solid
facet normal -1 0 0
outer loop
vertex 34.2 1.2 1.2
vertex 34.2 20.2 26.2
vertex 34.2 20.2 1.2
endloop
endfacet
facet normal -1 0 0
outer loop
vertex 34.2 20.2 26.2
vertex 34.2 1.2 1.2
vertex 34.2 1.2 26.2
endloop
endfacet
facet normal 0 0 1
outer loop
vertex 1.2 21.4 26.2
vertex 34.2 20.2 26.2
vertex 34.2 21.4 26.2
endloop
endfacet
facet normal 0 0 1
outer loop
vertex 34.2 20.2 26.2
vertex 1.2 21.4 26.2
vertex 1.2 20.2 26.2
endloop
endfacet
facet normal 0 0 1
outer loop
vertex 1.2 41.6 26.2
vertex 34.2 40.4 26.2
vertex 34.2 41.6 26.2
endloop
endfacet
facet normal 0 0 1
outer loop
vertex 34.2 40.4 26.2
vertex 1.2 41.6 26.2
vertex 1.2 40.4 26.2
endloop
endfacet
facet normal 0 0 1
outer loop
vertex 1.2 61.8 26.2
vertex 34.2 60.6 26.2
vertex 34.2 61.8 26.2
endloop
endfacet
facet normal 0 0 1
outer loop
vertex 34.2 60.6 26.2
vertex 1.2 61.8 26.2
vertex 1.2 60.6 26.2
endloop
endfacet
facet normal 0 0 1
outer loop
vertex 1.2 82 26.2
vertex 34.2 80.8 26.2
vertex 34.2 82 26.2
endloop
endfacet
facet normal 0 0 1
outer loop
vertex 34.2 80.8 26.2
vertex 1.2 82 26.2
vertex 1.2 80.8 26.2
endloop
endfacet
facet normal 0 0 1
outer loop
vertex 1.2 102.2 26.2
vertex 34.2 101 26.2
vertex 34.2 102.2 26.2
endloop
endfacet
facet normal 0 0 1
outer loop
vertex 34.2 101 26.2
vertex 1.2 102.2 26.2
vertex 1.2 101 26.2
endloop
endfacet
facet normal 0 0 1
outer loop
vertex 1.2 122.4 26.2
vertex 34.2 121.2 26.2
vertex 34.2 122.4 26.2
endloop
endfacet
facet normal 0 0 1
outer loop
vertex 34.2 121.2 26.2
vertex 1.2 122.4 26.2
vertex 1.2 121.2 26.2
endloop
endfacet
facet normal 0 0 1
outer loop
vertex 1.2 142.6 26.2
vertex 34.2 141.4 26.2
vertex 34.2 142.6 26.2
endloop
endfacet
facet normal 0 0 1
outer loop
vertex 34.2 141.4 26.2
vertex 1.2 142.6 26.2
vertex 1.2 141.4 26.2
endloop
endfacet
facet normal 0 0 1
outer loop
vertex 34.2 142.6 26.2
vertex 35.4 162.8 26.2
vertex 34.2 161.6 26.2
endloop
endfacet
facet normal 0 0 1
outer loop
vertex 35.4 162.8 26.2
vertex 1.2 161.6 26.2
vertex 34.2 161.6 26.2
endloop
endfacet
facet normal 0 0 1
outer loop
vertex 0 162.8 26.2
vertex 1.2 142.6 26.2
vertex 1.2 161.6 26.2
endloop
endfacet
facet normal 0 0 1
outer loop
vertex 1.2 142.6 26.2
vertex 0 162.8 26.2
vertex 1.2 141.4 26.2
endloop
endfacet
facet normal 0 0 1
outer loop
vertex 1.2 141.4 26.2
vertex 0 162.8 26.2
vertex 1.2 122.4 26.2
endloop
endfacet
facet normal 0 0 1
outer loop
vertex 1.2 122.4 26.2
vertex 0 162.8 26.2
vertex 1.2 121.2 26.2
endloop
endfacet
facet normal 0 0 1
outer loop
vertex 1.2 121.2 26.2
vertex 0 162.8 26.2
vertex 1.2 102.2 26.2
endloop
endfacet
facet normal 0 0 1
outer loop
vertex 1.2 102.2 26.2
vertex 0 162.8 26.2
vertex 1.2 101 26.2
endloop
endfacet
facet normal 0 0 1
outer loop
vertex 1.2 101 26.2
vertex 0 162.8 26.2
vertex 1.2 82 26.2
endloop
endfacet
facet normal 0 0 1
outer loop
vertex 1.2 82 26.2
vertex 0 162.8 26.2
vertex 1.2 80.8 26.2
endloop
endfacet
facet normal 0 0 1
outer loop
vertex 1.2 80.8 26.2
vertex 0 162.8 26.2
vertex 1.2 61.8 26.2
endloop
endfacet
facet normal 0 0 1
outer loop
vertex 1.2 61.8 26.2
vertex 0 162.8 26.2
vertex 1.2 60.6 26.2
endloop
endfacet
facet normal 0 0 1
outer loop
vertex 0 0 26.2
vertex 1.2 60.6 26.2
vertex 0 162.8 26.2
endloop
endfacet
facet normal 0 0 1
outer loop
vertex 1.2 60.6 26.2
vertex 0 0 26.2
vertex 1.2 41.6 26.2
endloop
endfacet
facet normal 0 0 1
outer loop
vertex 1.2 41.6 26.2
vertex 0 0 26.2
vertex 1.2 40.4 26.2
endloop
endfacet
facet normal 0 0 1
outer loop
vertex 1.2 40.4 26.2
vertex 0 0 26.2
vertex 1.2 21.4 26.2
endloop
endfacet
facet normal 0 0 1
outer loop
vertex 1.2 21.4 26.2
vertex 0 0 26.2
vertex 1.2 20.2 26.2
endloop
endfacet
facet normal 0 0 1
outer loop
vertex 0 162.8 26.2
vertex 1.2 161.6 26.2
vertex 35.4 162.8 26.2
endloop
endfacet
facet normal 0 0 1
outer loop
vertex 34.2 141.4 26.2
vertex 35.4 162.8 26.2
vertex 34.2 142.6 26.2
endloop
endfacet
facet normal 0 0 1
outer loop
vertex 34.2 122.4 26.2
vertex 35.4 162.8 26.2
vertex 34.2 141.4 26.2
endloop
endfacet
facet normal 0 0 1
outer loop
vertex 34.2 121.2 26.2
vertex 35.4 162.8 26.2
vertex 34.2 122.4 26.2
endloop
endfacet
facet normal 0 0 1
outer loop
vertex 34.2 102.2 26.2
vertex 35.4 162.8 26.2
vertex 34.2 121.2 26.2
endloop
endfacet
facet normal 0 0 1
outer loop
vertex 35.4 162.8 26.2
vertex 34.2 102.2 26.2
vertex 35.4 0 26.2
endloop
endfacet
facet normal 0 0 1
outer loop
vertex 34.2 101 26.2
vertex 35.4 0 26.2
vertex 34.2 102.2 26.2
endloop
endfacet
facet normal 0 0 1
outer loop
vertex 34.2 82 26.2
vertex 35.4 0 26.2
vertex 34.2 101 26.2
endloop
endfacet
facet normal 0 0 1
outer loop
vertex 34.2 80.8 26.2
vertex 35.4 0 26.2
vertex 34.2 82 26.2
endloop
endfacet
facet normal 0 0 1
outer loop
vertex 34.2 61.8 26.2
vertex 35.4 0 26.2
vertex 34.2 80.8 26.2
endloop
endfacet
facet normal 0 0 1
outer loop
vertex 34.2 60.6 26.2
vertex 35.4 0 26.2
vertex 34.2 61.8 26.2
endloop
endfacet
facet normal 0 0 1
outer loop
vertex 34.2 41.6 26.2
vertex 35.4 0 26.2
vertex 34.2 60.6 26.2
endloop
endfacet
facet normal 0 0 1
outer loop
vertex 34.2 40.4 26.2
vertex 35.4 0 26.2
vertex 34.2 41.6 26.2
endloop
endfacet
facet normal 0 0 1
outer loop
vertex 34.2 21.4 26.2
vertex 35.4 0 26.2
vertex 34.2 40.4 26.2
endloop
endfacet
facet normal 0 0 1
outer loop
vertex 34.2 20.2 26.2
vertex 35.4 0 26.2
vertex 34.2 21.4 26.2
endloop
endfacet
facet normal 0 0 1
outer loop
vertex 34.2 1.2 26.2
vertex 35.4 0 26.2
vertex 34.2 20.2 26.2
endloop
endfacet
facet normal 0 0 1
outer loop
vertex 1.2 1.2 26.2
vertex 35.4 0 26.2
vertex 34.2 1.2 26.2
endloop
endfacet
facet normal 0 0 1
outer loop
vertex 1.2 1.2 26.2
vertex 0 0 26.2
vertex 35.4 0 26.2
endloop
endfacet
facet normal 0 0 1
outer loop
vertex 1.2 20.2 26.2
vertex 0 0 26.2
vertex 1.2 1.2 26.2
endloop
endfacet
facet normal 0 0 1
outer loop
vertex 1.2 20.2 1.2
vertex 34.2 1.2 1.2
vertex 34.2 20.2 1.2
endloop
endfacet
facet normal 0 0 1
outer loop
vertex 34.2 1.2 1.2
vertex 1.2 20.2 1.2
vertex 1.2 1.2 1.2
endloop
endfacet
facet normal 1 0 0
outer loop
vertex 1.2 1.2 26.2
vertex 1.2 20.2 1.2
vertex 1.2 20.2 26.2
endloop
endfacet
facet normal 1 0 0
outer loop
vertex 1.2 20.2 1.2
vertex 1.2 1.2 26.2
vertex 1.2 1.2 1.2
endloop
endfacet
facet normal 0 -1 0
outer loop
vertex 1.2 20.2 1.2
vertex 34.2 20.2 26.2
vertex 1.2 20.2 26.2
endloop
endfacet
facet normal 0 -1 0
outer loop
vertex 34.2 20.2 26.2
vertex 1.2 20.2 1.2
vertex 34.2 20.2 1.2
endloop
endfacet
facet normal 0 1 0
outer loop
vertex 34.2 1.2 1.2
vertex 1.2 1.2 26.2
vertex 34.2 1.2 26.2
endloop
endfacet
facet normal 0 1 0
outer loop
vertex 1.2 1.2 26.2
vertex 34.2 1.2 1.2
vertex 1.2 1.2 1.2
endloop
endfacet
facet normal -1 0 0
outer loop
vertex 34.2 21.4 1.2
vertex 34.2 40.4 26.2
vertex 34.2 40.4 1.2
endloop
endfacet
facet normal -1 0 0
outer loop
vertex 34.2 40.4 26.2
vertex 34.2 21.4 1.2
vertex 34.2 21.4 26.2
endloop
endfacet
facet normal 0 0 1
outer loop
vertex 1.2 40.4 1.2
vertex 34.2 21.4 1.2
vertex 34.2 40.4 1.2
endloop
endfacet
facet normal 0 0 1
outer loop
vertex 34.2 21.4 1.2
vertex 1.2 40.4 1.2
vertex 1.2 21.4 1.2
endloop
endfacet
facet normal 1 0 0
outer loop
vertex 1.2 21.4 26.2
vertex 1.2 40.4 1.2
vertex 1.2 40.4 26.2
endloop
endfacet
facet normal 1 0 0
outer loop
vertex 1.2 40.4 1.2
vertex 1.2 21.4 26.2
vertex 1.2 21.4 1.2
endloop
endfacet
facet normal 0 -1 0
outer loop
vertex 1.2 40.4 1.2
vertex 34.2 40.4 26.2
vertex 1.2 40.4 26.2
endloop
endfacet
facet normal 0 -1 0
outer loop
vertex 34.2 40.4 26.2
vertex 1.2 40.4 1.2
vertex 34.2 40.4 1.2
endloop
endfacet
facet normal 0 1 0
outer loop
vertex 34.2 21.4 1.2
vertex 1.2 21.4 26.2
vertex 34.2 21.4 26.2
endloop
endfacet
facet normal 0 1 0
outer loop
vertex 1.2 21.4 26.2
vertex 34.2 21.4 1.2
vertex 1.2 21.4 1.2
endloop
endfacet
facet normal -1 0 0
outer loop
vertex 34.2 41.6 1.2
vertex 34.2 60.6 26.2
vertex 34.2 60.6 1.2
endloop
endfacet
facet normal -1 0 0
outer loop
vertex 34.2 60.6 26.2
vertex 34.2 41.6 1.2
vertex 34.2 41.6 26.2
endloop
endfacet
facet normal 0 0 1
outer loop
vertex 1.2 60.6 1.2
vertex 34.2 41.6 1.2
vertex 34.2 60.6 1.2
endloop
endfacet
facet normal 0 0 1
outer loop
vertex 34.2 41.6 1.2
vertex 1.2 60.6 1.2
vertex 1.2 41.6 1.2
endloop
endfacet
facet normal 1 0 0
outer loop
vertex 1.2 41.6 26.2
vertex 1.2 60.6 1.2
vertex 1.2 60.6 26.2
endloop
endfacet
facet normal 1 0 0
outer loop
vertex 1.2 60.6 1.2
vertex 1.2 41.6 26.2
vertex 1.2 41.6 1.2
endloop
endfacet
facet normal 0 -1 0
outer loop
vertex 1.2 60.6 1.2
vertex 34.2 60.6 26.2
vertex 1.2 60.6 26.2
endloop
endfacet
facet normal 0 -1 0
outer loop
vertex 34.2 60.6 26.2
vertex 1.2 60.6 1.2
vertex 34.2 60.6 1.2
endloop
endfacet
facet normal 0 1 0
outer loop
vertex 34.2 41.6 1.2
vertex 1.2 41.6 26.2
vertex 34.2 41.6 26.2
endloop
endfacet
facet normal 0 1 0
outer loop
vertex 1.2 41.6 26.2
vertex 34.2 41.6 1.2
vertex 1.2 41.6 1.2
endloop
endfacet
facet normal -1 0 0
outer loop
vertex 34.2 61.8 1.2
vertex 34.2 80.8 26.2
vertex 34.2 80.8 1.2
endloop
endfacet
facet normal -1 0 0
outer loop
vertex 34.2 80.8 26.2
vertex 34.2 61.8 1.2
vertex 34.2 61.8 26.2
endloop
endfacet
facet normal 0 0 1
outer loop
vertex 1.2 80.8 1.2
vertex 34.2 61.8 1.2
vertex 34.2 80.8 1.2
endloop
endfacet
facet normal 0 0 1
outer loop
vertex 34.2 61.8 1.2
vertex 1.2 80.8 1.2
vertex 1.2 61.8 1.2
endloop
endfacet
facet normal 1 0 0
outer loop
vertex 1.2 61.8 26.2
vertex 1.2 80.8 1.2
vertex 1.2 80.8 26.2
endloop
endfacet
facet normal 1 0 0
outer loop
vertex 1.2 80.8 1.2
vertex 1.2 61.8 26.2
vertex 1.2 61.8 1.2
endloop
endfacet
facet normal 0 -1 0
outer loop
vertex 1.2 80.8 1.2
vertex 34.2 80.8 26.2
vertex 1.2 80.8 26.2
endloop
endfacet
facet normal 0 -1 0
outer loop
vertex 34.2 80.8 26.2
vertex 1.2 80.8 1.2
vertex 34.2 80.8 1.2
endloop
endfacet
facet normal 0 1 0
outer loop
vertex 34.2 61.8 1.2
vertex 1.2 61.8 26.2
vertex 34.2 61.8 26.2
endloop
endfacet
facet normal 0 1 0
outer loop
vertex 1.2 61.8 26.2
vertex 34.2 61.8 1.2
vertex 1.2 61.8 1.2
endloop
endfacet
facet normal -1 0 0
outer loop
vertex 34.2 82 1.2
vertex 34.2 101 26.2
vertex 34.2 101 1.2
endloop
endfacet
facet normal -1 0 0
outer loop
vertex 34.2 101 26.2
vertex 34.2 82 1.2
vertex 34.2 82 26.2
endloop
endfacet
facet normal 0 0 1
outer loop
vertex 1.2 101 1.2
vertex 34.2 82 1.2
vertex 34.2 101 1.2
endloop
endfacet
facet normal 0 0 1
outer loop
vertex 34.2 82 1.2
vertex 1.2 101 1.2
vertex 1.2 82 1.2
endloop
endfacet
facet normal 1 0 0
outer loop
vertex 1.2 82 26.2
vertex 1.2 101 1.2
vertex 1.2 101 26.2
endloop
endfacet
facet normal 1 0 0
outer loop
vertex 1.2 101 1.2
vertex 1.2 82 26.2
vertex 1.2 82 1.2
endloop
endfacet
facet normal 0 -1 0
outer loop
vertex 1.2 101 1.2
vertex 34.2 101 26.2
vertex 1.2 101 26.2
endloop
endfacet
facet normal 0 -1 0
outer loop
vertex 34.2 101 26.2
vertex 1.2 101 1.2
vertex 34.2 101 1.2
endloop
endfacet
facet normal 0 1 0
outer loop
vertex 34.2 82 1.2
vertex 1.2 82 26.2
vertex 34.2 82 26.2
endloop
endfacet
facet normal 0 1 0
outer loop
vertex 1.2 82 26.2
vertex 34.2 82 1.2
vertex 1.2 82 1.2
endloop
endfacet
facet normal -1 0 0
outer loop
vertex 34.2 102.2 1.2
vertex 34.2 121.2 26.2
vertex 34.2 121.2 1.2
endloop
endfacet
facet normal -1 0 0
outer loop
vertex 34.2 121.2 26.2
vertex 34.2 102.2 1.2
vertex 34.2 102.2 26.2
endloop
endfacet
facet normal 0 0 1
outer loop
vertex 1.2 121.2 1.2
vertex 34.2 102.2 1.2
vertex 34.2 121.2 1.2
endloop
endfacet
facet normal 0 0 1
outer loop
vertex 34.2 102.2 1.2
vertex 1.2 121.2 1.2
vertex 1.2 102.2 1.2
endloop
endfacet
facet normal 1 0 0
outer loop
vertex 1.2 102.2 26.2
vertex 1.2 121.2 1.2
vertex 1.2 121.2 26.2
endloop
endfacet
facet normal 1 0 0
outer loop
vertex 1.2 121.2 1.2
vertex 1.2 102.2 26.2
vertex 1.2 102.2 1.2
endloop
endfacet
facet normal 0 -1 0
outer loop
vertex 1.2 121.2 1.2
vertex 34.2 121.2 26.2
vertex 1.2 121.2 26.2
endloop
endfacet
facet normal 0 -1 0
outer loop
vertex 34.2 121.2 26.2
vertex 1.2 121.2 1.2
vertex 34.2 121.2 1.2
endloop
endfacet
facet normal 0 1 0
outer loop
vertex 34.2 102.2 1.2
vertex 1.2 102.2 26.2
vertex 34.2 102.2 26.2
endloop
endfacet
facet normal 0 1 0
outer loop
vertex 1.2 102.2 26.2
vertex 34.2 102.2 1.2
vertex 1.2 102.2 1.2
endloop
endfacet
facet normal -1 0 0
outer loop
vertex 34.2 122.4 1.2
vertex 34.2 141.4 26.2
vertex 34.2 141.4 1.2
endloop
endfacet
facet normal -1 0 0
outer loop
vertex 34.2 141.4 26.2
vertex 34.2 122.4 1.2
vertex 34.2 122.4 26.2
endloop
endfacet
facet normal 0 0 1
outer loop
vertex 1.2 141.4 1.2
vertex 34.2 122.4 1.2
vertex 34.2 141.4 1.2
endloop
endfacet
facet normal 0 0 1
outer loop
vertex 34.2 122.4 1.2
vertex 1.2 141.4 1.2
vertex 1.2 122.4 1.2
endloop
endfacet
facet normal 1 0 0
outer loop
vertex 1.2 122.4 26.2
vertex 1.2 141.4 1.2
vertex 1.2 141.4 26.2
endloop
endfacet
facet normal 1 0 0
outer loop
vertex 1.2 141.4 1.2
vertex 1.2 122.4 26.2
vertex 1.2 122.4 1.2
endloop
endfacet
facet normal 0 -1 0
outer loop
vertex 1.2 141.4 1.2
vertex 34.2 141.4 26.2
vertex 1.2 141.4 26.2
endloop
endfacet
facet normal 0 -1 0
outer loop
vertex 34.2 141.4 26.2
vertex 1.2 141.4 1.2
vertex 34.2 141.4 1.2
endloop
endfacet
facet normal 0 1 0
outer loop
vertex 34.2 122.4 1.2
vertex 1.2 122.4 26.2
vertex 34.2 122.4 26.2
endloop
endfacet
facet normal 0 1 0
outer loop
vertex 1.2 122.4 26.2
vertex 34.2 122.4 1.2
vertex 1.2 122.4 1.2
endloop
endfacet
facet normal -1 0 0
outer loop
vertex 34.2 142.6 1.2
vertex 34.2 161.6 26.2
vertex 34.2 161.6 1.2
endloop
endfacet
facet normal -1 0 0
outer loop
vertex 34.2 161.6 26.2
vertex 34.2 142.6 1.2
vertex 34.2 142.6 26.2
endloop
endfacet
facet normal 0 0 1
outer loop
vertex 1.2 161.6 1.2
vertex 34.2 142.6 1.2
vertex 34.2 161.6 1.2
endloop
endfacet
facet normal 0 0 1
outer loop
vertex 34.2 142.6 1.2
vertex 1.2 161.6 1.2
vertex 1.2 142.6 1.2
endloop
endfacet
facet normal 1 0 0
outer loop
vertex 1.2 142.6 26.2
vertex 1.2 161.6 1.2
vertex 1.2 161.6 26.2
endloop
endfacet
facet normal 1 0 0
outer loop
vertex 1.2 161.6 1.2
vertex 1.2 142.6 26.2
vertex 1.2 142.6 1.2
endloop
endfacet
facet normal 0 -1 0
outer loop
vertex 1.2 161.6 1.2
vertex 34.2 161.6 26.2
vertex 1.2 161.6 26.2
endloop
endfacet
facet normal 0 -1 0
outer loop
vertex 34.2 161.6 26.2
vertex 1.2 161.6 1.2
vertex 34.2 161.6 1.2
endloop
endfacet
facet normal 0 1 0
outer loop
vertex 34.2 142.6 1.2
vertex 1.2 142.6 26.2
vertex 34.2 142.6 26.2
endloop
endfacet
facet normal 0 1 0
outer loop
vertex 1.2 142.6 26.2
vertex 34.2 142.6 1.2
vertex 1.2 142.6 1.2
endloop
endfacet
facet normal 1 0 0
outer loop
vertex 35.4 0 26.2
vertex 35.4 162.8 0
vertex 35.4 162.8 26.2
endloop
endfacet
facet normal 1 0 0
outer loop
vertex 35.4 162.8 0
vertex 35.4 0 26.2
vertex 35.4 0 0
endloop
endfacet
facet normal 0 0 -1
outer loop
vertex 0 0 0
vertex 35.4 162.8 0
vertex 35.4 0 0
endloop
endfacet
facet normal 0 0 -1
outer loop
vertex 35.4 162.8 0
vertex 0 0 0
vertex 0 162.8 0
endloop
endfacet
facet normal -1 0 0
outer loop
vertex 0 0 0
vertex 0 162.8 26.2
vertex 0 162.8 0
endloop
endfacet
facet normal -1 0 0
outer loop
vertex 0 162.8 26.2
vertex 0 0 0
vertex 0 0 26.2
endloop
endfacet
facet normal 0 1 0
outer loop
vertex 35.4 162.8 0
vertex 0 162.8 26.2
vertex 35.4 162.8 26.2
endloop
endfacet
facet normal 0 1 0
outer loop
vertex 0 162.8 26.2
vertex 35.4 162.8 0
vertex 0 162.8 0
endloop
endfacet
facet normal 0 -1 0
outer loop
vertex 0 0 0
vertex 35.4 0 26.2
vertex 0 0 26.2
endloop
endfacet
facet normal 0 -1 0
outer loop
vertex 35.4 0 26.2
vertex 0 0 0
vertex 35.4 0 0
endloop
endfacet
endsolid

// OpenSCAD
cols = 1;
rows = 8;

walls = 1.2;
bottom = 1.2;

depth = 19;
width = 33;

height = 25;

echo(rows* depth + (rows + 1) * depth);
render() {
  difference() {
    cube([cols * width + (cols + 1) * walls, rows * depth + (rows + 1) * walls, height + bottom]);
    for (i = [0:cols - 1]) {
      for (j = [0:rows - 1]) {
        translate([i * width + walls * (i + 1), j * depth + walls * (j + 1), bottom]) {
          cube([width, depth, height]);
        }
      }
    }
  }
}
